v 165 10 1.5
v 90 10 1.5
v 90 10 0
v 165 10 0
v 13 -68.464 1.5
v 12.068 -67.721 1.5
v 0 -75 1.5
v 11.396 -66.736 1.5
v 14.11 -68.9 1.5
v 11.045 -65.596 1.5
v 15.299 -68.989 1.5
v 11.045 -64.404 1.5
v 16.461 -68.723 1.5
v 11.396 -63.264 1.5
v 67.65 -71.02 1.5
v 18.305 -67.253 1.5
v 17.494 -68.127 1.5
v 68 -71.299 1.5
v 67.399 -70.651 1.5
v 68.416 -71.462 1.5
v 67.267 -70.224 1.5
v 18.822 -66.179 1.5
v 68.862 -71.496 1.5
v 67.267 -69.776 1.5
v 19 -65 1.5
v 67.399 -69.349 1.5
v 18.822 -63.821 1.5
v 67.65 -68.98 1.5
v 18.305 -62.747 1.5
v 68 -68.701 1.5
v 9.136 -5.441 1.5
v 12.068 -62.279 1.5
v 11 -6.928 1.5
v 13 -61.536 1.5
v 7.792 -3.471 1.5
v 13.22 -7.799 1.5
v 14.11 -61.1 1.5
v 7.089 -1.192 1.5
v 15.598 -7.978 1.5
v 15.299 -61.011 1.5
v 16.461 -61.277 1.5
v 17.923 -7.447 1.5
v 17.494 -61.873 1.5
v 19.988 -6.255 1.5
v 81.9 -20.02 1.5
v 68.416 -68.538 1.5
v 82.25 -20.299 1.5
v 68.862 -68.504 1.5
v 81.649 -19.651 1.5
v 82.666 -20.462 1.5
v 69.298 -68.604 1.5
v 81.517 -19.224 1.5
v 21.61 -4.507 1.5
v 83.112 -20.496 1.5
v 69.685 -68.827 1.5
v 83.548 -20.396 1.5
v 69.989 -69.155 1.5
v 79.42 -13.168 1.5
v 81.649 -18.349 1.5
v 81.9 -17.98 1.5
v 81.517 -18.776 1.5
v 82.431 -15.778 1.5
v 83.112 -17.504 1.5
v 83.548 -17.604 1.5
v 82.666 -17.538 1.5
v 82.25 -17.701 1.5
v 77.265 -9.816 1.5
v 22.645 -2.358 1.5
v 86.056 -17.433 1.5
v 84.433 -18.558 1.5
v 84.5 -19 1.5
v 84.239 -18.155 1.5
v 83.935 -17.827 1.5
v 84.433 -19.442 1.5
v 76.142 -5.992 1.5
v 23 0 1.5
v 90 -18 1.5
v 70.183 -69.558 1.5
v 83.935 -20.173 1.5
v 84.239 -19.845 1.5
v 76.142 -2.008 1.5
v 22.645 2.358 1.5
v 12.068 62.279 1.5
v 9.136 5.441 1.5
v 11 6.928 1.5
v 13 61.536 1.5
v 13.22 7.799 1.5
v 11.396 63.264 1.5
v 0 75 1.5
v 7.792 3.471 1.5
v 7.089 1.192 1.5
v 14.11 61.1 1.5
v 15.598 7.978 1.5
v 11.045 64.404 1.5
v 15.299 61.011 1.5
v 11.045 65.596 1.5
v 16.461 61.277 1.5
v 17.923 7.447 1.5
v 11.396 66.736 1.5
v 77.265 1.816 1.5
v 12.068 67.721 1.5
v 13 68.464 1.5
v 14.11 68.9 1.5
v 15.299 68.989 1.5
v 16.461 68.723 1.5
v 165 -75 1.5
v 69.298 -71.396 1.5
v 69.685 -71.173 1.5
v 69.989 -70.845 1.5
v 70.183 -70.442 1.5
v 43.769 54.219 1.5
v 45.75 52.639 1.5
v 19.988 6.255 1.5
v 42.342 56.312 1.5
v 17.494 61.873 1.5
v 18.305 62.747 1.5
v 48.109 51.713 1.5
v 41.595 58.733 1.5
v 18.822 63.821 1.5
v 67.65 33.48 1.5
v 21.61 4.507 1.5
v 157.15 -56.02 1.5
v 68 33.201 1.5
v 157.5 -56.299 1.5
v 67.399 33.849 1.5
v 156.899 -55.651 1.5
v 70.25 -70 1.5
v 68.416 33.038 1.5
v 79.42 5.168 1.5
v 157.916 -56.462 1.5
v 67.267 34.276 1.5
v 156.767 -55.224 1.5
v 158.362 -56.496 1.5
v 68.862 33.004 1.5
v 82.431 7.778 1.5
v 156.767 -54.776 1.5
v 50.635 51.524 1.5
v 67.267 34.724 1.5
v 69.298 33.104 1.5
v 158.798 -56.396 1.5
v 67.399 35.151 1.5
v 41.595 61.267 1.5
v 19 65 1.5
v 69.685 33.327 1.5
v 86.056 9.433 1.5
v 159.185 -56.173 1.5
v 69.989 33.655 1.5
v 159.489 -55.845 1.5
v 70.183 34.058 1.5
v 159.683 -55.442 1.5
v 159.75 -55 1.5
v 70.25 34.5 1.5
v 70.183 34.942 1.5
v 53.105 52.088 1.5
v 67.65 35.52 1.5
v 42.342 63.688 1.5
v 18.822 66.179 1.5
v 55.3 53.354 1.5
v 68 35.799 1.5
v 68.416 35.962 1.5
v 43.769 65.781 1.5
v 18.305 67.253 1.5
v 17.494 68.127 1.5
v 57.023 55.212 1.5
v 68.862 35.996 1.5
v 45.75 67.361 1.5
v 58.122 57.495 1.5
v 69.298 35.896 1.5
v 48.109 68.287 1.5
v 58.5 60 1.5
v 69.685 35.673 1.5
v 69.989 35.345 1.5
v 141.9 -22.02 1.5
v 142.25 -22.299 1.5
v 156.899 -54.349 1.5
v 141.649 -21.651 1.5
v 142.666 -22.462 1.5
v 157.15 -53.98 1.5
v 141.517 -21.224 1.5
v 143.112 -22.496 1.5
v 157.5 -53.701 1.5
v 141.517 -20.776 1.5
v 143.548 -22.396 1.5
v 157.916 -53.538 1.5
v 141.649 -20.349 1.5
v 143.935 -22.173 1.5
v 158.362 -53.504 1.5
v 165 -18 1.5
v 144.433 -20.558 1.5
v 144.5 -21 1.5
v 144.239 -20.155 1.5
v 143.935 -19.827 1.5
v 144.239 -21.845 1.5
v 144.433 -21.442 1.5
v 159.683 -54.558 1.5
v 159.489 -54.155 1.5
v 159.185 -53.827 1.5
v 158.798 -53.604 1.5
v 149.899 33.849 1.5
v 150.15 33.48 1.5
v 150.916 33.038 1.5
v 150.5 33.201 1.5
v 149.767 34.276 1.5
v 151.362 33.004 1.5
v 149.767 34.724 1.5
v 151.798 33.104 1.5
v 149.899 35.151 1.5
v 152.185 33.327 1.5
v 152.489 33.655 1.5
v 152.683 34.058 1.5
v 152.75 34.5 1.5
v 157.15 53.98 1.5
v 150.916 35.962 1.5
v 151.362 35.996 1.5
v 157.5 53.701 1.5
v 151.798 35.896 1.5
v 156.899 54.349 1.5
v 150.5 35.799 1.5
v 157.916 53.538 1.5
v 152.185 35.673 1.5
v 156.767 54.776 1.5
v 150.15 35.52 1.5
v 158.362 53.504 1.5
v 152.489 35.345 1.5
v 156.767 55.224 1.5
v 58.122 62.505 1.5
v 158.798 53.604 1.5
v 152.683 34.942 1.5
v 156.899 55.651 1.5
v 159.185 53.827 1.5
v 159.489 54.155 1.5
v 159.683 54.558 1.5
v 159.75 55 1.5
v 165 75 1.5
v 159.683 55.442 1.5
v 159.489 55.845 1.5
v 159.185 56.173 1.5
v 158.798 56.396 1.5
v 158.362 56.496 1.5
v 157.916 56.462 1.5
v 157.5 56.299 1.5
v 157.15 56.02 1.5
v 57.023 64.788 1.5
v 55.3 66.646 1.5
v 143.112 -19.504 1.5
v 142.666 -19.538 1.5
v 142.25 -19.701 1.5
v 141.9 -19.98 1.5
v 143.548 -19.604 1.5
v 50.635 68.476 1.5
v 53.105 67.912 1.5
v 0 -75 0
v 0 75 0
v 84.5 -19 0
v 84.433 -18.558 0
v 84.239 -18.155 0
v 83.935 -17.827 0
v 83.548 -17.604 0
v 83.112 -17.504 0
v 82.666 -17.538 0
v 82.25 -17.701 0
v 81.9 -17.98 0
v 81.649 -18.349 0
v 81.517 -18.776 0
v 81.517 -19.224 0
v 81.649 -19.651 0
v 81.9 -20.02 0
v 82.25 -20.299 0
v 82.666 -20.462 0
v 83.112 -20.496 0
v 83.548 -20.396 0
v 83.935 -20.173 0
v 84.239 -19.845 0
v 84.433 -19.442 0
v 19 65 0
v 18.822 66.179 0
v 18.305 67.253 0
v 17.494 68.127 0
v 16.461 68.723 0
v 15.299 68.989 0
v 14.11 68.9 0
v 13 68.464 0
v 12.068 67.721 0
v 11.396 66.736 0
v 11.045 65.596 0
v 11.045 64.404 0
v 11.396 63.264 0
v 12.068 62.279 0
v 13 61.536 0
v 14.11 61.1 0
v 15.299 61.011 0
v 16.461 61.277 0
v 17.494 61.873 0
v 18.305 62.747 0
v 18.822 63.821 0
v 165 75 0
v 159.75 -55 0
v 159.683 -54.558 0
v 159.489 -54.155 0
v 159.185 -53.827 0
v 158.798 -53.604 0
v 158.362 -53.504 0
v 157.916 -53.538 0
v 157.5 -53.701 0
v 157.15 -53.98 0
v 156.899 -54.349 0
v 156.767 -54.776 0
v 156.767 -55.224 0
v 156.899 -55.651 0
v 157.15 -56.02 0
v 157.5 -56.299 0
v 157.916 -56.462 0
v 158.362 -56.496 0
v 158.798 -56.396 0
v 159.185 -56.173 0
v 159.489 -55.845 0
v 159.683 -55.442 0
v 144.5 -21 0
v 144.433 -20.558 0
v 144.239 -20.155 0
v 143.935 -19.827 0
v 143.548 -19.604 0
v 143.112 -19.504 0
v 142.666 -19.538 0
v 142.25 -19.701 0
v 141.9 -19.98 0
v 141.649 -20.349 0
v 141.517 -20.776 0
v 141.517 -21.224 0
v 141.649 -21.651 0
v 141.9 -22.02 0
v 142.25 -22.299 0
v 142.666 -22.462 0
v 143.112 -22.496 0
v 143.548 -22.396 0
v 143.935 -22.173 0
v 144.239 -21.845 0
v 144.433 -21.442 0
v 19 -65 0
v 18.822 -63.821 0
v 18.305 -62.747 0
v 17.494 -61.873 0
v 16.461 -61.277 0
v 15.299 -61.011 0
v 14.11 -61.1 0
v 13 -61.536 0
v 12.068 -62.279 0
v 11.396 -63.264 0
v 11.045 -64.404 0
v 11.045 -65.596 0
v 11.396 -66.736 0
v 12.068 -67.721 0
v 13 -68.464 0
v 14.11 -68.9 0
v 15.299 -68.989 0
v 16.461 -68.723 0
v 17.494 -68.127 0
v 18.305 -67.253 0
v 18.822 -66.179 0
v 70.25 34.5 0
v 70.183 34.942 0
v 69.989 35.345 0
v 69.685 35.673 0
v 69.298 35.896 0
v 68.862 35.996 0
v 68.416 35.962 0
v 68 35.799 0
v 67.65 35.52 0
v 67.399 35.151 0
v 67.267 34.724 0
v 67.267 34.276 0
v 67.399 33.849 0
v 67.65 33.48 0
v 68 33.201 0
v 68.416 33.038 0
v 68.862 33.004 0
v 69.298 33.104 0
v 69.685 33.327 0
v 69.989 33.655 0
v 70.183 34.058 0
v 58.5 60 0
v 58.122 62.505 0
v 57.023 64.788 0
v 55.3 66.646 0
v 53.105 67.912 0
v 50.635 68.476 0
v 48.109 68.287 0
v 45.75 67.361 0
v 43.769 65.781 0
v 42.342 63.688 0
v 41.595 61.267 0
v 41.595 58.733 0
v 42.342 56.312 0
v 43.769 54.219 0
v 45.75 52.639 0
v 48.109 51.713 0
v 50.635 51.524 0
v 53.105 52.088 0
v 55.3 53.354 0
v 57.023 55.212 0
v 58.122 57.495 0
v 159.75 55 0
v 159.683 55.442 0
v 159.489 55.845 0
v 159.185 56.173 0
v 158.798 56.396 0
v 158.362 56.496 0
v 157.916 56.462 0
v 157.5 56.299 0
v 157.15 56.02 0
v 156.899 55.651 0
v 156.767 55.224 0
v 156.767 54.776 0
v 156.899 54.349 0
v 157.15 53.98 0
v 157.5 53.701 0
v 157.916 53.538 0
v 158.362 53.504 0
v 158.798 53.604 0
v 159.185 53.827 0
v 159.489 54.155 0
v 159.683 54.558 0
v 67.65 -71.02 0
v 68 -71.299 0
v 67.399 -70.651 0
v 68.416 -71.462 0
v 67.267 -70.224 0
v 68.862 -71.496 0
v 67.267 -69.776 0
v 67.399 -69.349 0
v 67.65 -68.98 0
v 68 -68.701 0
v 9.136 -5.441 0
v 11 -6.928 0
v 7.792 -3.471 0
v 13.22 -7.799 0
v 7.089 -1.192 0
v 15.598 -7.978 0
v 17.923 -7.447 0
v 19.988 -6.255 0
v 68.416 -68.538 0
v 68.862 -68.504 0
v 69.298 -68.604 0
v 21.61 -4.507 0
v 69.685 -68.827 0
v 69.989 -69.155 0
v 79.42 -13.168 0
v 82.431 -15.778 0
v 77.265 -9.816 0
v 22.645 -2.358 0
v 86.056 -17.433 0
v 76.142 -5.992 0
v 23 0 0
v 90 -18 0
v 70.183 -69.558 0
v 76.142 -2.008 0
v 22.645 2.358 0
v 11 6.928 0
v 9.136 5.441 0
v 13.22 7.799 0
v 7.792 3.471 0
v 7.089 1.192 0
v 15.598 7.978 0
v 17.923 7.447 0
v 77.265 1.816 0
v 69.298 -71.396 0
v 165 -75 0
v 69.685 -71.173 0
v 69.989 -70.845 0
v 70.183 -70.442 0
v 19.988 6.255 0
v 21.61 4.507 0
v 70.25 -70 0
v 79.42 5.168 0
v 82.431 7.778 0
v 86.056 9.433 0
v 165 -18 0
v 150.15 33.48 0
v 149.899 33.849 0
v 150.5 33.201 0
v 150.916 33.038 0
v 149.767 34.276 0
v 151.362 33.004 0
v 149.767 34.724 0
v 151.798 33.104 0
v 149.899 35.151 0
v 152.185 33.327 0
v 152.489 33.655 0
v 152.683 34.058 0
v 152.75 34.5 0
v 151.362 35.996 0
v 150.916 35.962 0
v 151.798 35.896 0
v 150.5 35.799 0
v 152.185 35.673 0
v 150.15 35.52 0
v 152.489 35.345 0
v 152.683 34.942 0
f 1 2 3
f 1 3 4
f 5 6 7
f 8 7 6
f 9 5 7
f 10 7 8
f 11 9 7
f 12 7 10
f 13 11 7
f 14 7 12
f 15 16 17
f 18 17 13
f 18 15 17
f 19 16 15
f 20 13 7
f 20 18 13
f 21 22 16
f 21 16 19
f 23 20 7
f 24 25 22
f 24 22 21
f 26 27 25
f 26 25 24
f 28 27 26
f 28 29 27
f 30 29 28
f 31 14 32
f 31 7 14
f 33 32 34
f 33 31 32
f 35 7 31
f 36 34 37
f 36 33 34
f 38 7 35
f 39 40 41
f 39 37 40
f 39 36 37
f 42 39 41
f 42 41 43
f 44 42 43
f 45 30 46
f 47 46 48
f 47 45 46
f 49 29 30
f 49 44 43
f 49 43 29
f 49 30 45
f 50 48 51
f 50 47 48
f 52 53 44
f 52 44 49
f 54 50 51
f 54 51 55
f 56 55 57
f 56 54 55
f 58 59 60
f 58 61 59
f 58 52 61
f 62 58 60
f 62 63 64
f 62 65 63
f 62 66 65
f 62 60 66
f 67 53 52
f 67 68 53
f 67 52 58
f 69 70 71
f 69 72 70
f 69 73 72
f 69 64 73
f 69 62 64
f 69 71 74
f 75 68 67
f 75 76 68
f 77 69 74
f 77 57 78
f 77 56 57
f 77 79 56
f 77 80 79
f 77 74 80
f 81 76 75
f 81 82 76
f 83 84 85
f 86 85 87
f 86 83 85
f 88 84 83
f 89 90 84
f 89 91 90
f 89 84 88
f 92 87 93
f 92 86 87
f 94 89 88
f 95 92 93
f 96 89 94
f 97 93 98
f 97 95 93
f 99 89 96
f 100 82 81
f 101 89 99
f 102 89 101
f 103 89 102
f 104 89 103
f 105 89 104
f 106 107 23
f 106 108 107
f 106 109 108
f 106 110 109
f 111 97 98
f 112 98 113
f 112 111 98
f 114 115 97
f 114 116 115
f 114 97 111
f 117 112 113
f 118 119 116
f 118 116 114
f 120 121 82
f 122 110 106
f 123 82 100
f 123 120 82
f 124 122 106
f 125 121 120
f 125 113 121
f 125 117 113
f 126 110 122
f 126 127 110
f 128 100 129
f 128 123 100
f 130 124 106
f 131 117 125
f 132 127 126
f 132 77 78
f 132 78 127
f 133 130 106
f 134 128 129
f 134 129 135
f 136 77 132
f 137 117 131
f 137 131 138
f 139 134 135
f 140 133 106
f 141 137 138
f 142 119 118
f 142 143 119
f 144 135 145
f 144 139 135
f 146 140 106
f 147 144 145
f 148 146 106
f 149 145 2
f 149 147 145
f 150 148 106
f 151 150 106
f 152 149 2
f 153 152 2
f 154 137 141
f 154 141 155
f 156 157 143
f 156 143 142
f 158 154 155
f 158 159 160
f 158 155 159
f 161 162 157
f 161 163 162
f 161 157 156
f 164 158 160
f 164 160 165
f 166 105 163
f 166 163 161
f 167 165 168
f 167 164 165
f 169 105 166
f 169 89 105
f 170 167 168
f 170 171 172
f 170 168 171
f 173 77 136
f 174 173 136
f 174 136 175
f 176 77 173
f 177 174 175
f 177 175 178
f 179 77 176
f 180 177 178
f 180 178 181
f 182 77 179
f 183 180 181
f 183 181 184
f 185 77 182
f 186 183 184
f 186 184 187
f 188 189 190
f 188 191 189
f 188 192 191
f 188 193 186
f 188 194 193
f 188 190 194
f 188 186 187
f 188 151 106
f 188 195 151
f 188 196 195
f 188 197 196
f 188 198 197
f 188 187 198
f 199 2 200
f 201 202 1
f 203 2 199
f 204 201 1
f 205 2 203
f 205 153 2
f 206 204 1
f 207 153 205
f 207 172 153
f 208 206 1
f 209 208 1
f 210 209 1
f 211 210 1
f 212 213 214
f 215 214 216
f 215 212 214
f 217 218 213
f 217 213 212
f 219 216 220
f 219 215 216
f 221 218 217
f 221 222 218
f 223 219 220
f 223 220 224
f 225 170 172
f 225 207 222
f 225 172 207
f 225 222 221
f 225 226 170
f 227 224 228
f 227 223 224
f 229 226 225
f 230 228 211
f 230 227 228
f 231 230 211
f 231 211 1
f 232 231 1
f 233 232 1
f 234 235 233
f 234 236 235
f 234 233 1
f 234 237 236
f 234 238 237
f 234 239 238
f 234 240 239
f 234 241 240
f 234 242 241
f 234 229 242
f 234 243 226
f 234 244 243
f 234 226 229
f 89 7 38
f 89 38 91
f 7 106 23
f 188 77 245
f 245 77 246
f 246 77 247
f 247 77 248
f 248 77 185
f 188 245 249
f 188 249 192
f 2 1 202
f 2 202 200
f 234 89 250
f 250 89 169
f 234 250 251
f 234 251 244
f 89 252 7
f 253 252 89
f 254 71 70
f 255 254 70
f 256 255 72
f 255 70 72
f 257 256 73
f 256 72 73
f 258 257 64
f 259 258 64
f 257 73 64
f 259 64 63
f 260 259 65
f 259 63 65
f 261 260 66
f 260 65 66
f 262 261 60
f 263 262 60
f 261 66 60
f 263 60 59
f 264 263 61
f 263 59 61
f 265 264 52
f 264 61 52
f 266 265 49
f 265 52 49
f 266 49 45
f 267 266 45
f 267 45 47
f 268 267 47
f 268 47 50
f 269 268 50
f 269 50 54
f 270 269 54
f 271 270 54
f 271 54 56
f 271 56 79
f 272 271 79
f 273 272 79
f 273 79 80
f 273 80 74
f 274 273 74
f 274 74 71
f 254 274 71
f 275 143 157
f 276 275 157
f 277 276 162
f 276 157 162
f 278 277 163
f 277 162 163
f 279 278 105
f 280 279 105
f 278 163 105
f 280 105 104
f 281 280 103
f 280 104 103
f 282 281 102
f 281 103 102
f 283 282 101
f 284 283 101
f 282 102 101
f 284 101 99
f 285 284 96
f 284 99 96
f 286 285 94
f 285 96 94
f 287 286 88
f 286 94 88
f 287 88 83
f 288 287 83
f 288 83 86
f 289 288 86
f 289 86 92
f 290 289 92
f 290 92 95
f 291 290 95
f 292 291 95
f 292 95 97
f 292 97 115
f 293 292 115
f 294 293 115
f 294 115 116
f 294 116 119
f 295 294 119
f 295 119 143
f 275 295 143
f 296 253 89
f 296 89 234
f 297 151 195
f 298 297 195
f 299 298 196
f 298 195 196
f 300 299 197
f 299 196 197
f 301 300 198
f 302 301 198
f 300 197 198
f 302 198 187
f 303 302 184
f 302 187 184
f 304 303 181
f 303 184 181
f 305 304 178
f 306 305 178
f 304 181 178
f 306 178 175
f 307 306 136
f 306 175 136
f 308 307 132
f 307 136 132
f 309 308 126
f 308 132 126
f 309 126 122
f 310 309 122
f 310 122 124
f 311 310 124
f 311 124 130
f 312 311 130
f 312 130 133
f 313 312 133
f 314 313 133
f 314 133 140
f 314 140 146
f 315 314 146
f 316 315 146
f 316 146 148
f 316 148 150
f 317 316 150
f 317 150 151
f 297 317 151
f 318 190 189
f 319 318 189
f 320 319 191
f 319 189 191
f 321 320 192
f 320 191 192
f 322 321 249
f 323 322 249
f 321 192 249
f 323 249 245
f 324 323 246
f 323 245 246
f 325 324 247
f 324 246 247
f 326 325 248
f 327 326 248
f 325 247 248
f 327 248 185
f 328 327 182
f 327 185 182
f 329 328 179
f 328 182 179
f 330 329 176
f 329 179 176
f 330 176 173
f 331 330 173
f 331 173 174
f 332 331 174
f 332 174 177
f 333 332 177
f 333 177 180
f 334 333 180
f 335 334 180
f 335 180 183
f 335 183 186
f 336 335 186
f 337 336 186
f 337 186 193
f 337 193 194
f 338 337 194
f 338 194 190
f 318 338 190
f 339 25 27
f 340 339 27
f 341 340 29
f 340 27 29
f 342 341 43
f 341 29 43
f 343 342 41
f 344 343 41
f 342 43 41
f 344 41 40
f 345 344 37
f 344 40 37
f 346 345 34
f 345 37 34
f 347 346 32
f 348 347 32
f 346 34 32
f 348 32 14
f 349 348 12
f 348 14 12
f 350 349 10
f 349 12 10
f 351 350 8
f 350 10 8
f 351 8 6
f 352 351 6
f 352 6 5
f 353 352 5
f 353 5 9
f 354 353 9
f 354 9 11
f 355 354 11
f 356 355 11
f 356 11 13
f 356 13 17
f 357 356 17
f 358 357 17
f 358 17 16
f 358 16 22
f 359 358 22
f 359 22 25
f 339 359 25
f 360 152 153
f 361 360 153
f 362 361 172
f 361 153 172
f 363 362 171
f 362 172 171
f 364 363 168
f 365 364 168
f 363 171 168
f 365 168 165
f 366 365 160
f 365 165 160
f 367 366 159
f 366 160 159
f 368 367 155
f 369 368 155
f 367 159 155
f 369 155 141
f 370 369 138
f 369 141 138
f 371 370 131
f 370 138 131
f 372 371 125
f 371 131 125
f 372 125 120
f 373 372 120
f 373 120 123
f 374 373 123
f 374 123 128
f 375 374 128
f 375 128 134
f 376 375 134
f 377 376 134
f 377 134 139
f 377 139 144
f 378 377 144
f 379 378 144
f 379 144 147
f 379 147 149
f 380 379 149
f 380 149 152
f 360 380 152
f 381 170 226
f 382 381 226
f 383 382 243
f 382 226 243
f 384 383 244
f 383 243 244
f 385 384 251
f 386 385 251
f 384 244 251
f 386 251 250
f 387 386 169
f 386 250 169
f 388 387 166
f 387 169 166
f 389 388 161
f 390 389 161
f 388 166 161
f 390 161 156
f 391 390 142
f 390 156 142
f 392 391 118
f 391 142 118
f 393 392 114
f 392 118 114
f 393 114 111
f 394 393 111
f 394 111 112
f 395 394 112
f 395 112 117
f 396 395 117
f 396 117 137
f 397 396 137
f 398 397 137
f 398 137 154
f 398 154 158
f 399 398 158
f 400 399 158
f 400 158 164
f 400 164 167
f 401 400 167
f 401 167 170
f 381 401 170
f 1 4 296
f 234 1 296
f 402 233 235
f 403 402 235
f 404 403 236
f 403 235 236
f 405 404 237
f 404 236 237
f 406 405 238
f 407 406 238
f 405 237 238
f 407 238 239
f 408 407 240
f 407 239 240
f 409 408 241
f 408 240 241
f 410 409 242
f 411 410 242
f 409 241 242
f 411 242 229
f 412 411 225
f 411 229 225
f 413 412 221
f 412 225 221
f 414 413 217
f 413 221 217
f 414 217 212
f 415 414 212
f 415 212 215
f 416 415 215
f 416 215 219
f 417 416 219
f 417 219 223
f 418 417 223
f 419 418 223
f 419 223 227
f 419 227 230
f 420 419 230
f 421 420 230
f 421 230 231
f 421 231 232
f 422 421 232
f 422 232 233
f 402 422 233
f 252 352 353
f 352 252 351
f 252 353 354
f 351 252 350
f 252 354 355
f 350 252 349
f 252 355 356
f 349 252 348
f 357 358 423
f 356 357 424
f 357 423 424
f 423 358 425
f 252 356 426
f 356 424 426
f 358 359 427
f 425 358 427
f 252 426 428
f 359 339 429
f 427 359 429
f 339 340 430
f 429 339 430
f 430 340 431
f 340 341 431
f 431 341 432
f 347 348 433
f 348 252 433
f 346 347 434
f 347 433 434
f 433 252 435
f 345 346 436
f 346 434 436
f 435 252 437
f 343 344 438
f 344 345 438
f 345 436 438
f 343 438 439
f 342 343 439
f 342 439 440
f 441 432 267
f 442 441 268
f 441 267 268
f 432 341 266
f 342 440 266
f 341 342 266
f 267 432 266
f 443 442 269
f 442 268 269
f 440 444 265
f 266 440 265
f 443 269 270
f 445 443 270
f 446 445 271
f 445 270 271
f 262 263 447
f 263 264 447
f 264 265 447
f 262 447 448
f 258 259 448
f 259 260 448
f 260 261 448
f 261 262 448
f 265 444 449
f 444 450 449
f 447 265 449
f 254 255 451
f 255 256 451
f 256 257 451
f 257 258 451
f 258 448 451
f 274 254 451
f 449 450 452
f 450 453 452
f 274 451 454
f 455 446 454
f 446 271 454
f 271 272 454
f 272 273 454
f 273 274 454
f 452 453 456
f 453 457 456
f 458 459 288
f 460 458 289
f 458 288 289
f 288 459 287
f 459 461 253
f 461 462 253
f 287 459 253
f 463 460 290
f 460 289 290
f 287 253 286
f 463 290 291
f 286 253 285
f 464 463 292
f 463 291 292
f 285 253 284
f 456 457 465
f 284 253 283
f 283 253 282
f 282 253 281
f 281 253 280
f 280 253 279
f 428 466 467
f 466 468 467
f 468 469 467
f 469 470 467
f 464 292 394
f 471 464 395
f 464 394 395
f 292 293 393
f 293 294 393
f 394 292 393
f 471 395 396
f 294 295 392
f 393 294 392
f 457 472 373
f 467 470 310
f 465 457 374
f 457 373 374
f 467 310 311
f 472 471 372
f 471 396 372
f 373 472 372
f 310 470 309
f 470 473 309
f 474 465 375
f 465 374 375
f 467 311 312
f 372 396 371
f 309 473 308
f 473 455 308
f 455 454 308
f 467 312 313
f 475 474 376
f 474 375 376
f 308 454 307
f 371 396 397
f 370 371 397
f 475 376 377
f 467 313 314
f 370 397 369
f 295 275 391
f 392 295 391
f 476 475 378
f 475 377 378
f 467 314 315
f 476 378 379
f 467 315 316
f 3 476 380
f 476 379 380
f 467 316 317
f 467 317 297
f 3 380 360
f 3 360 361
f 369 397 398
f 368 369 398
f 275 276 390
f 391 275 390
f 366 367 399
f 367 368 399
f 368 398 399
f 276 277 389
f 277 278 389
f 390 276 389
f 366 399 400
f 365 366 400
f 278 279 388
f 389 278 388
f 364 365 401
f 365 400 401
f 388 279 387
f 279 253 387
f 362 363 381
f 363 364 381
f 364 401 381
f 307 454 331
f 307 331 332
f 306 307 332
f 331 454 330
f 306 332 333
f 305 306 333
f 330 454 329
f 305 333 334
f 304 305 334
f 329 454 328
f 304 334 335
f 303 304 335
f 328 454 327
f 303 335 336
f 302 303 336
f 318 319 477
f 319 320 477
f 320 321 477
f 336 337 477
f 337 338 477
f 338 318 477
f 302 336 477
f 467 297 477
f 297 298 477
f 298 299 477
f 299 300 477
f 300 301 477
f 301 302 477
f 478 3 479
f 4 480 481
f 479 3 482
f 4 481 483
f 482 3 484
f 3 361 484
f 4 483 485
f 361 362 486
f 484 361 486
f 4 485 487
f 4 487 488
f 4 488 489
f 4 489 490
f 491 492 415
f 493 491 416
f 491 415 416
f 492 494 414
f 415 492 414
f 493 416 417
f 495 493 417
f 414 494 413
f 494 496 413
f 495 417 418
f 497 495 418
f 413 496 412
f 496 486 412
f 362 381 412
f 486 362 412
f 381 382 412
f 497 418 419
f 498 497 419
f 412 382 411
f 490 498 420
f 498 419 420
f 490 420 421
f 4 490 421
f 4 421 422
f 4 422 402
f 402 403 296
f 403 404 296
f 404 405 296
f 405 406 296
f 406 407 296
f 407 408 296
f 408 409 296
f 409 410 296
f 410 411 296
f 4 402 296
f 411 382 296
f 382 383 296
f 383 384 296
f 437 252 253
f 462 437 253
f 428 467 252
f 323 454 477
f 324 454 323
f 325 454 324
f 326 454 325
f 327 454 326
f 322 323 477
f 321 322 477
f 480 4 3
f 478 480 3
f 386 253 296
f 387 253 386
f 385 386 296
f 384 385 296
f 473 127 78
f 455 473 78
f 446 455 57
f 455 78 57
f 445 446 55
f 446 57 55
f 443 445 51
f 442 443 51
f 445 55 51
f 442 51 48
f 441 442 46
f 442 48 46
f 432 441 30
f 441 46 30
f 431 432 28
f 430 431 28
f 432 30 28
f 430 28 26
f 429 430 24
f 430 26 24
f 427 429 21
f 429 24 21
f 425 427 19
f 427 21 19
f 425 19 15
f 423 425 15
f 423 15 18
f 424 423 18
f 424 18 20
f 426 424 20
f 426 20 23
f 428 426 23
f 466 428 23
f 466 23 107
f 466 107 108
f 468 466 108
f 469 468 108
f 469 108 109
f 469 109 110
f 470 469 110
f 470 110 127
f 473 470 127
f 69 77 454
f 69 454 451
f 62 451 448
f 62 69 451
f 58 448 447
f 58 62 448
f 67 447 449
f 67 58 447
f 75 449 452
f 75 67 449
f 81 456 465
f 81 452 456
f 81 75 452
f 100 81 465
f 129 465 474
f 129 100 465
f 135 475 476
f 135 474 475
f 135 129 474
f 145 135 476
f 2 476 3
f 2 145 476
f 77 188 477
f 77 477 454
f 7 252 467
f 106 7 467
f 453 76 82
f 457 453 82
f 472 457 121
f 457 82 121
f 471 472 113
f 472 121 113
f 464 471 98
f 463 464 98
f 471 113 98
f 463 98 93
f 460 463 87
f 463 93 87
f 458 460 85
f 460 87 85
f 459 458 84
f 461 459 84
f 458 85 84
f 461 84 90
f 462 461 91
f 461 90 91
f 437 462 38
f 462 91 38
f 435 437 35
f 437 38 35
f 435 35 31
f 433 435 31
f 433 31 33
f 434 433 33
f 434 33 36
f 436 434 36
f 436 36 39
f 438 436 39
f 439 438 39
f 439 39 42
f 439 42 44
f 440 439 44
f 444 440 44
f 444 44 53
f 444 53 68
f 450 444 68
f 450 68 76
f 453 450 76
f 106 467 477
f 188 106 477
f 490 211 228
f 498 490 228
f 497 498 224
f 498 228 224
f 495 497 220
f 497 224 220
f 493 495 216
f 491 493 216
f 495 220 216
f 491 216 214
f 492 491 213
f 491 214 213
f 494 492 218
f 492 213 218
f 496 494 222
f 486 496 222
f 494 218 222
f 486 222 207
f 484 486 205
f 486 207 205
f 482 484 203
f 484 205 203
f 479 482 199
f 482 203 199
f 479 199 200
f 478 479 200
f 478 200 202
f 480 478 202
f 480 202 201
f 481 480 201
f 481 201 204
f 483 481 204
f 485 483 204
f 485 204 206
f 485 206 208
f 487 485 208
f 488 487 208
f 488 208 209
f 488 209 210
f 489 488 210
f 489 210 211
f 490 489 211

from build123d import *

# Parameters (mm, degrees)
ESQUISSE1_W             = 165
ESQUISSE1_H             = 150
BOSS_EXTRU_1_DEPTH      = 1.5
ESQUISSE2_R             = 1.5
ESQUISSE2_R_2           = 8
ESQUISSE2_R_3           = 4
ESQUISSE2_R_4           = 8.5
ENL_V_MAT_EXTRU_1_DEPTH = 182.251896542


with BuildPart() as part:
    # Esquisse1 → Boss.-Extru.1 (new body)
    with BuildSketch(Plane.XY):
        with Locations((82.5, 0)):
            Rectangle(ESQUISSE1_W, ESQUISSE1_H)
    extrude(amount=BOSS_EXTRU_1_DEPTH)

    # Esquisse2 → Enlèv. mat.-Extru.1 (cut, through all)
    with BuildSketch(Plane.XY.offset(1.5)):
        with Locations((158.25, 55)):
            Circle(ESQUISSE2_R)
        with Locations((158.25, -55)):
            Circle(ESQUISSE2_R)
        with Locations((151.25, 34.5)):
            Circle(ESQUISSE2_R)
        with Locations((83, -19)):
            Circle(ESQUISSE2_R)
        with Locations((143, -21)):
            Circle(ESQUISSE2_R)
        with Locations((15, 0)):
            Circle(ESQUISSE2_R_2)
        with Locations((15, 65)):
            Circle(ESQUISSE2_R_3)
        with Locations((15, -65)):
            Circle(ESQUISSE2_R_3)
        with Locations((50, 60)):
            Circle(ESQUISSE2_R_4)
        with Locations((68.75, 34.5)):
            Circle(ESQUISSE2_R)
        with Locations((68.75, -70)):
            Circle(ESQUISSE2_R)
        with BuildLine():
            Line((90, 10), (165, 10))
            ThreePointArc((165, 10), (179, -4), (165, -18))
            Line((165, -18), (90, -18))
            ThreePointArc((90, -18), (76, -4), (90, 10))
        make_face()
    extrude(amount=-ENL_V_MAT_EXTRU_1_DEPTH, mode=Mode.SUBTRACT)


solid = part.part
